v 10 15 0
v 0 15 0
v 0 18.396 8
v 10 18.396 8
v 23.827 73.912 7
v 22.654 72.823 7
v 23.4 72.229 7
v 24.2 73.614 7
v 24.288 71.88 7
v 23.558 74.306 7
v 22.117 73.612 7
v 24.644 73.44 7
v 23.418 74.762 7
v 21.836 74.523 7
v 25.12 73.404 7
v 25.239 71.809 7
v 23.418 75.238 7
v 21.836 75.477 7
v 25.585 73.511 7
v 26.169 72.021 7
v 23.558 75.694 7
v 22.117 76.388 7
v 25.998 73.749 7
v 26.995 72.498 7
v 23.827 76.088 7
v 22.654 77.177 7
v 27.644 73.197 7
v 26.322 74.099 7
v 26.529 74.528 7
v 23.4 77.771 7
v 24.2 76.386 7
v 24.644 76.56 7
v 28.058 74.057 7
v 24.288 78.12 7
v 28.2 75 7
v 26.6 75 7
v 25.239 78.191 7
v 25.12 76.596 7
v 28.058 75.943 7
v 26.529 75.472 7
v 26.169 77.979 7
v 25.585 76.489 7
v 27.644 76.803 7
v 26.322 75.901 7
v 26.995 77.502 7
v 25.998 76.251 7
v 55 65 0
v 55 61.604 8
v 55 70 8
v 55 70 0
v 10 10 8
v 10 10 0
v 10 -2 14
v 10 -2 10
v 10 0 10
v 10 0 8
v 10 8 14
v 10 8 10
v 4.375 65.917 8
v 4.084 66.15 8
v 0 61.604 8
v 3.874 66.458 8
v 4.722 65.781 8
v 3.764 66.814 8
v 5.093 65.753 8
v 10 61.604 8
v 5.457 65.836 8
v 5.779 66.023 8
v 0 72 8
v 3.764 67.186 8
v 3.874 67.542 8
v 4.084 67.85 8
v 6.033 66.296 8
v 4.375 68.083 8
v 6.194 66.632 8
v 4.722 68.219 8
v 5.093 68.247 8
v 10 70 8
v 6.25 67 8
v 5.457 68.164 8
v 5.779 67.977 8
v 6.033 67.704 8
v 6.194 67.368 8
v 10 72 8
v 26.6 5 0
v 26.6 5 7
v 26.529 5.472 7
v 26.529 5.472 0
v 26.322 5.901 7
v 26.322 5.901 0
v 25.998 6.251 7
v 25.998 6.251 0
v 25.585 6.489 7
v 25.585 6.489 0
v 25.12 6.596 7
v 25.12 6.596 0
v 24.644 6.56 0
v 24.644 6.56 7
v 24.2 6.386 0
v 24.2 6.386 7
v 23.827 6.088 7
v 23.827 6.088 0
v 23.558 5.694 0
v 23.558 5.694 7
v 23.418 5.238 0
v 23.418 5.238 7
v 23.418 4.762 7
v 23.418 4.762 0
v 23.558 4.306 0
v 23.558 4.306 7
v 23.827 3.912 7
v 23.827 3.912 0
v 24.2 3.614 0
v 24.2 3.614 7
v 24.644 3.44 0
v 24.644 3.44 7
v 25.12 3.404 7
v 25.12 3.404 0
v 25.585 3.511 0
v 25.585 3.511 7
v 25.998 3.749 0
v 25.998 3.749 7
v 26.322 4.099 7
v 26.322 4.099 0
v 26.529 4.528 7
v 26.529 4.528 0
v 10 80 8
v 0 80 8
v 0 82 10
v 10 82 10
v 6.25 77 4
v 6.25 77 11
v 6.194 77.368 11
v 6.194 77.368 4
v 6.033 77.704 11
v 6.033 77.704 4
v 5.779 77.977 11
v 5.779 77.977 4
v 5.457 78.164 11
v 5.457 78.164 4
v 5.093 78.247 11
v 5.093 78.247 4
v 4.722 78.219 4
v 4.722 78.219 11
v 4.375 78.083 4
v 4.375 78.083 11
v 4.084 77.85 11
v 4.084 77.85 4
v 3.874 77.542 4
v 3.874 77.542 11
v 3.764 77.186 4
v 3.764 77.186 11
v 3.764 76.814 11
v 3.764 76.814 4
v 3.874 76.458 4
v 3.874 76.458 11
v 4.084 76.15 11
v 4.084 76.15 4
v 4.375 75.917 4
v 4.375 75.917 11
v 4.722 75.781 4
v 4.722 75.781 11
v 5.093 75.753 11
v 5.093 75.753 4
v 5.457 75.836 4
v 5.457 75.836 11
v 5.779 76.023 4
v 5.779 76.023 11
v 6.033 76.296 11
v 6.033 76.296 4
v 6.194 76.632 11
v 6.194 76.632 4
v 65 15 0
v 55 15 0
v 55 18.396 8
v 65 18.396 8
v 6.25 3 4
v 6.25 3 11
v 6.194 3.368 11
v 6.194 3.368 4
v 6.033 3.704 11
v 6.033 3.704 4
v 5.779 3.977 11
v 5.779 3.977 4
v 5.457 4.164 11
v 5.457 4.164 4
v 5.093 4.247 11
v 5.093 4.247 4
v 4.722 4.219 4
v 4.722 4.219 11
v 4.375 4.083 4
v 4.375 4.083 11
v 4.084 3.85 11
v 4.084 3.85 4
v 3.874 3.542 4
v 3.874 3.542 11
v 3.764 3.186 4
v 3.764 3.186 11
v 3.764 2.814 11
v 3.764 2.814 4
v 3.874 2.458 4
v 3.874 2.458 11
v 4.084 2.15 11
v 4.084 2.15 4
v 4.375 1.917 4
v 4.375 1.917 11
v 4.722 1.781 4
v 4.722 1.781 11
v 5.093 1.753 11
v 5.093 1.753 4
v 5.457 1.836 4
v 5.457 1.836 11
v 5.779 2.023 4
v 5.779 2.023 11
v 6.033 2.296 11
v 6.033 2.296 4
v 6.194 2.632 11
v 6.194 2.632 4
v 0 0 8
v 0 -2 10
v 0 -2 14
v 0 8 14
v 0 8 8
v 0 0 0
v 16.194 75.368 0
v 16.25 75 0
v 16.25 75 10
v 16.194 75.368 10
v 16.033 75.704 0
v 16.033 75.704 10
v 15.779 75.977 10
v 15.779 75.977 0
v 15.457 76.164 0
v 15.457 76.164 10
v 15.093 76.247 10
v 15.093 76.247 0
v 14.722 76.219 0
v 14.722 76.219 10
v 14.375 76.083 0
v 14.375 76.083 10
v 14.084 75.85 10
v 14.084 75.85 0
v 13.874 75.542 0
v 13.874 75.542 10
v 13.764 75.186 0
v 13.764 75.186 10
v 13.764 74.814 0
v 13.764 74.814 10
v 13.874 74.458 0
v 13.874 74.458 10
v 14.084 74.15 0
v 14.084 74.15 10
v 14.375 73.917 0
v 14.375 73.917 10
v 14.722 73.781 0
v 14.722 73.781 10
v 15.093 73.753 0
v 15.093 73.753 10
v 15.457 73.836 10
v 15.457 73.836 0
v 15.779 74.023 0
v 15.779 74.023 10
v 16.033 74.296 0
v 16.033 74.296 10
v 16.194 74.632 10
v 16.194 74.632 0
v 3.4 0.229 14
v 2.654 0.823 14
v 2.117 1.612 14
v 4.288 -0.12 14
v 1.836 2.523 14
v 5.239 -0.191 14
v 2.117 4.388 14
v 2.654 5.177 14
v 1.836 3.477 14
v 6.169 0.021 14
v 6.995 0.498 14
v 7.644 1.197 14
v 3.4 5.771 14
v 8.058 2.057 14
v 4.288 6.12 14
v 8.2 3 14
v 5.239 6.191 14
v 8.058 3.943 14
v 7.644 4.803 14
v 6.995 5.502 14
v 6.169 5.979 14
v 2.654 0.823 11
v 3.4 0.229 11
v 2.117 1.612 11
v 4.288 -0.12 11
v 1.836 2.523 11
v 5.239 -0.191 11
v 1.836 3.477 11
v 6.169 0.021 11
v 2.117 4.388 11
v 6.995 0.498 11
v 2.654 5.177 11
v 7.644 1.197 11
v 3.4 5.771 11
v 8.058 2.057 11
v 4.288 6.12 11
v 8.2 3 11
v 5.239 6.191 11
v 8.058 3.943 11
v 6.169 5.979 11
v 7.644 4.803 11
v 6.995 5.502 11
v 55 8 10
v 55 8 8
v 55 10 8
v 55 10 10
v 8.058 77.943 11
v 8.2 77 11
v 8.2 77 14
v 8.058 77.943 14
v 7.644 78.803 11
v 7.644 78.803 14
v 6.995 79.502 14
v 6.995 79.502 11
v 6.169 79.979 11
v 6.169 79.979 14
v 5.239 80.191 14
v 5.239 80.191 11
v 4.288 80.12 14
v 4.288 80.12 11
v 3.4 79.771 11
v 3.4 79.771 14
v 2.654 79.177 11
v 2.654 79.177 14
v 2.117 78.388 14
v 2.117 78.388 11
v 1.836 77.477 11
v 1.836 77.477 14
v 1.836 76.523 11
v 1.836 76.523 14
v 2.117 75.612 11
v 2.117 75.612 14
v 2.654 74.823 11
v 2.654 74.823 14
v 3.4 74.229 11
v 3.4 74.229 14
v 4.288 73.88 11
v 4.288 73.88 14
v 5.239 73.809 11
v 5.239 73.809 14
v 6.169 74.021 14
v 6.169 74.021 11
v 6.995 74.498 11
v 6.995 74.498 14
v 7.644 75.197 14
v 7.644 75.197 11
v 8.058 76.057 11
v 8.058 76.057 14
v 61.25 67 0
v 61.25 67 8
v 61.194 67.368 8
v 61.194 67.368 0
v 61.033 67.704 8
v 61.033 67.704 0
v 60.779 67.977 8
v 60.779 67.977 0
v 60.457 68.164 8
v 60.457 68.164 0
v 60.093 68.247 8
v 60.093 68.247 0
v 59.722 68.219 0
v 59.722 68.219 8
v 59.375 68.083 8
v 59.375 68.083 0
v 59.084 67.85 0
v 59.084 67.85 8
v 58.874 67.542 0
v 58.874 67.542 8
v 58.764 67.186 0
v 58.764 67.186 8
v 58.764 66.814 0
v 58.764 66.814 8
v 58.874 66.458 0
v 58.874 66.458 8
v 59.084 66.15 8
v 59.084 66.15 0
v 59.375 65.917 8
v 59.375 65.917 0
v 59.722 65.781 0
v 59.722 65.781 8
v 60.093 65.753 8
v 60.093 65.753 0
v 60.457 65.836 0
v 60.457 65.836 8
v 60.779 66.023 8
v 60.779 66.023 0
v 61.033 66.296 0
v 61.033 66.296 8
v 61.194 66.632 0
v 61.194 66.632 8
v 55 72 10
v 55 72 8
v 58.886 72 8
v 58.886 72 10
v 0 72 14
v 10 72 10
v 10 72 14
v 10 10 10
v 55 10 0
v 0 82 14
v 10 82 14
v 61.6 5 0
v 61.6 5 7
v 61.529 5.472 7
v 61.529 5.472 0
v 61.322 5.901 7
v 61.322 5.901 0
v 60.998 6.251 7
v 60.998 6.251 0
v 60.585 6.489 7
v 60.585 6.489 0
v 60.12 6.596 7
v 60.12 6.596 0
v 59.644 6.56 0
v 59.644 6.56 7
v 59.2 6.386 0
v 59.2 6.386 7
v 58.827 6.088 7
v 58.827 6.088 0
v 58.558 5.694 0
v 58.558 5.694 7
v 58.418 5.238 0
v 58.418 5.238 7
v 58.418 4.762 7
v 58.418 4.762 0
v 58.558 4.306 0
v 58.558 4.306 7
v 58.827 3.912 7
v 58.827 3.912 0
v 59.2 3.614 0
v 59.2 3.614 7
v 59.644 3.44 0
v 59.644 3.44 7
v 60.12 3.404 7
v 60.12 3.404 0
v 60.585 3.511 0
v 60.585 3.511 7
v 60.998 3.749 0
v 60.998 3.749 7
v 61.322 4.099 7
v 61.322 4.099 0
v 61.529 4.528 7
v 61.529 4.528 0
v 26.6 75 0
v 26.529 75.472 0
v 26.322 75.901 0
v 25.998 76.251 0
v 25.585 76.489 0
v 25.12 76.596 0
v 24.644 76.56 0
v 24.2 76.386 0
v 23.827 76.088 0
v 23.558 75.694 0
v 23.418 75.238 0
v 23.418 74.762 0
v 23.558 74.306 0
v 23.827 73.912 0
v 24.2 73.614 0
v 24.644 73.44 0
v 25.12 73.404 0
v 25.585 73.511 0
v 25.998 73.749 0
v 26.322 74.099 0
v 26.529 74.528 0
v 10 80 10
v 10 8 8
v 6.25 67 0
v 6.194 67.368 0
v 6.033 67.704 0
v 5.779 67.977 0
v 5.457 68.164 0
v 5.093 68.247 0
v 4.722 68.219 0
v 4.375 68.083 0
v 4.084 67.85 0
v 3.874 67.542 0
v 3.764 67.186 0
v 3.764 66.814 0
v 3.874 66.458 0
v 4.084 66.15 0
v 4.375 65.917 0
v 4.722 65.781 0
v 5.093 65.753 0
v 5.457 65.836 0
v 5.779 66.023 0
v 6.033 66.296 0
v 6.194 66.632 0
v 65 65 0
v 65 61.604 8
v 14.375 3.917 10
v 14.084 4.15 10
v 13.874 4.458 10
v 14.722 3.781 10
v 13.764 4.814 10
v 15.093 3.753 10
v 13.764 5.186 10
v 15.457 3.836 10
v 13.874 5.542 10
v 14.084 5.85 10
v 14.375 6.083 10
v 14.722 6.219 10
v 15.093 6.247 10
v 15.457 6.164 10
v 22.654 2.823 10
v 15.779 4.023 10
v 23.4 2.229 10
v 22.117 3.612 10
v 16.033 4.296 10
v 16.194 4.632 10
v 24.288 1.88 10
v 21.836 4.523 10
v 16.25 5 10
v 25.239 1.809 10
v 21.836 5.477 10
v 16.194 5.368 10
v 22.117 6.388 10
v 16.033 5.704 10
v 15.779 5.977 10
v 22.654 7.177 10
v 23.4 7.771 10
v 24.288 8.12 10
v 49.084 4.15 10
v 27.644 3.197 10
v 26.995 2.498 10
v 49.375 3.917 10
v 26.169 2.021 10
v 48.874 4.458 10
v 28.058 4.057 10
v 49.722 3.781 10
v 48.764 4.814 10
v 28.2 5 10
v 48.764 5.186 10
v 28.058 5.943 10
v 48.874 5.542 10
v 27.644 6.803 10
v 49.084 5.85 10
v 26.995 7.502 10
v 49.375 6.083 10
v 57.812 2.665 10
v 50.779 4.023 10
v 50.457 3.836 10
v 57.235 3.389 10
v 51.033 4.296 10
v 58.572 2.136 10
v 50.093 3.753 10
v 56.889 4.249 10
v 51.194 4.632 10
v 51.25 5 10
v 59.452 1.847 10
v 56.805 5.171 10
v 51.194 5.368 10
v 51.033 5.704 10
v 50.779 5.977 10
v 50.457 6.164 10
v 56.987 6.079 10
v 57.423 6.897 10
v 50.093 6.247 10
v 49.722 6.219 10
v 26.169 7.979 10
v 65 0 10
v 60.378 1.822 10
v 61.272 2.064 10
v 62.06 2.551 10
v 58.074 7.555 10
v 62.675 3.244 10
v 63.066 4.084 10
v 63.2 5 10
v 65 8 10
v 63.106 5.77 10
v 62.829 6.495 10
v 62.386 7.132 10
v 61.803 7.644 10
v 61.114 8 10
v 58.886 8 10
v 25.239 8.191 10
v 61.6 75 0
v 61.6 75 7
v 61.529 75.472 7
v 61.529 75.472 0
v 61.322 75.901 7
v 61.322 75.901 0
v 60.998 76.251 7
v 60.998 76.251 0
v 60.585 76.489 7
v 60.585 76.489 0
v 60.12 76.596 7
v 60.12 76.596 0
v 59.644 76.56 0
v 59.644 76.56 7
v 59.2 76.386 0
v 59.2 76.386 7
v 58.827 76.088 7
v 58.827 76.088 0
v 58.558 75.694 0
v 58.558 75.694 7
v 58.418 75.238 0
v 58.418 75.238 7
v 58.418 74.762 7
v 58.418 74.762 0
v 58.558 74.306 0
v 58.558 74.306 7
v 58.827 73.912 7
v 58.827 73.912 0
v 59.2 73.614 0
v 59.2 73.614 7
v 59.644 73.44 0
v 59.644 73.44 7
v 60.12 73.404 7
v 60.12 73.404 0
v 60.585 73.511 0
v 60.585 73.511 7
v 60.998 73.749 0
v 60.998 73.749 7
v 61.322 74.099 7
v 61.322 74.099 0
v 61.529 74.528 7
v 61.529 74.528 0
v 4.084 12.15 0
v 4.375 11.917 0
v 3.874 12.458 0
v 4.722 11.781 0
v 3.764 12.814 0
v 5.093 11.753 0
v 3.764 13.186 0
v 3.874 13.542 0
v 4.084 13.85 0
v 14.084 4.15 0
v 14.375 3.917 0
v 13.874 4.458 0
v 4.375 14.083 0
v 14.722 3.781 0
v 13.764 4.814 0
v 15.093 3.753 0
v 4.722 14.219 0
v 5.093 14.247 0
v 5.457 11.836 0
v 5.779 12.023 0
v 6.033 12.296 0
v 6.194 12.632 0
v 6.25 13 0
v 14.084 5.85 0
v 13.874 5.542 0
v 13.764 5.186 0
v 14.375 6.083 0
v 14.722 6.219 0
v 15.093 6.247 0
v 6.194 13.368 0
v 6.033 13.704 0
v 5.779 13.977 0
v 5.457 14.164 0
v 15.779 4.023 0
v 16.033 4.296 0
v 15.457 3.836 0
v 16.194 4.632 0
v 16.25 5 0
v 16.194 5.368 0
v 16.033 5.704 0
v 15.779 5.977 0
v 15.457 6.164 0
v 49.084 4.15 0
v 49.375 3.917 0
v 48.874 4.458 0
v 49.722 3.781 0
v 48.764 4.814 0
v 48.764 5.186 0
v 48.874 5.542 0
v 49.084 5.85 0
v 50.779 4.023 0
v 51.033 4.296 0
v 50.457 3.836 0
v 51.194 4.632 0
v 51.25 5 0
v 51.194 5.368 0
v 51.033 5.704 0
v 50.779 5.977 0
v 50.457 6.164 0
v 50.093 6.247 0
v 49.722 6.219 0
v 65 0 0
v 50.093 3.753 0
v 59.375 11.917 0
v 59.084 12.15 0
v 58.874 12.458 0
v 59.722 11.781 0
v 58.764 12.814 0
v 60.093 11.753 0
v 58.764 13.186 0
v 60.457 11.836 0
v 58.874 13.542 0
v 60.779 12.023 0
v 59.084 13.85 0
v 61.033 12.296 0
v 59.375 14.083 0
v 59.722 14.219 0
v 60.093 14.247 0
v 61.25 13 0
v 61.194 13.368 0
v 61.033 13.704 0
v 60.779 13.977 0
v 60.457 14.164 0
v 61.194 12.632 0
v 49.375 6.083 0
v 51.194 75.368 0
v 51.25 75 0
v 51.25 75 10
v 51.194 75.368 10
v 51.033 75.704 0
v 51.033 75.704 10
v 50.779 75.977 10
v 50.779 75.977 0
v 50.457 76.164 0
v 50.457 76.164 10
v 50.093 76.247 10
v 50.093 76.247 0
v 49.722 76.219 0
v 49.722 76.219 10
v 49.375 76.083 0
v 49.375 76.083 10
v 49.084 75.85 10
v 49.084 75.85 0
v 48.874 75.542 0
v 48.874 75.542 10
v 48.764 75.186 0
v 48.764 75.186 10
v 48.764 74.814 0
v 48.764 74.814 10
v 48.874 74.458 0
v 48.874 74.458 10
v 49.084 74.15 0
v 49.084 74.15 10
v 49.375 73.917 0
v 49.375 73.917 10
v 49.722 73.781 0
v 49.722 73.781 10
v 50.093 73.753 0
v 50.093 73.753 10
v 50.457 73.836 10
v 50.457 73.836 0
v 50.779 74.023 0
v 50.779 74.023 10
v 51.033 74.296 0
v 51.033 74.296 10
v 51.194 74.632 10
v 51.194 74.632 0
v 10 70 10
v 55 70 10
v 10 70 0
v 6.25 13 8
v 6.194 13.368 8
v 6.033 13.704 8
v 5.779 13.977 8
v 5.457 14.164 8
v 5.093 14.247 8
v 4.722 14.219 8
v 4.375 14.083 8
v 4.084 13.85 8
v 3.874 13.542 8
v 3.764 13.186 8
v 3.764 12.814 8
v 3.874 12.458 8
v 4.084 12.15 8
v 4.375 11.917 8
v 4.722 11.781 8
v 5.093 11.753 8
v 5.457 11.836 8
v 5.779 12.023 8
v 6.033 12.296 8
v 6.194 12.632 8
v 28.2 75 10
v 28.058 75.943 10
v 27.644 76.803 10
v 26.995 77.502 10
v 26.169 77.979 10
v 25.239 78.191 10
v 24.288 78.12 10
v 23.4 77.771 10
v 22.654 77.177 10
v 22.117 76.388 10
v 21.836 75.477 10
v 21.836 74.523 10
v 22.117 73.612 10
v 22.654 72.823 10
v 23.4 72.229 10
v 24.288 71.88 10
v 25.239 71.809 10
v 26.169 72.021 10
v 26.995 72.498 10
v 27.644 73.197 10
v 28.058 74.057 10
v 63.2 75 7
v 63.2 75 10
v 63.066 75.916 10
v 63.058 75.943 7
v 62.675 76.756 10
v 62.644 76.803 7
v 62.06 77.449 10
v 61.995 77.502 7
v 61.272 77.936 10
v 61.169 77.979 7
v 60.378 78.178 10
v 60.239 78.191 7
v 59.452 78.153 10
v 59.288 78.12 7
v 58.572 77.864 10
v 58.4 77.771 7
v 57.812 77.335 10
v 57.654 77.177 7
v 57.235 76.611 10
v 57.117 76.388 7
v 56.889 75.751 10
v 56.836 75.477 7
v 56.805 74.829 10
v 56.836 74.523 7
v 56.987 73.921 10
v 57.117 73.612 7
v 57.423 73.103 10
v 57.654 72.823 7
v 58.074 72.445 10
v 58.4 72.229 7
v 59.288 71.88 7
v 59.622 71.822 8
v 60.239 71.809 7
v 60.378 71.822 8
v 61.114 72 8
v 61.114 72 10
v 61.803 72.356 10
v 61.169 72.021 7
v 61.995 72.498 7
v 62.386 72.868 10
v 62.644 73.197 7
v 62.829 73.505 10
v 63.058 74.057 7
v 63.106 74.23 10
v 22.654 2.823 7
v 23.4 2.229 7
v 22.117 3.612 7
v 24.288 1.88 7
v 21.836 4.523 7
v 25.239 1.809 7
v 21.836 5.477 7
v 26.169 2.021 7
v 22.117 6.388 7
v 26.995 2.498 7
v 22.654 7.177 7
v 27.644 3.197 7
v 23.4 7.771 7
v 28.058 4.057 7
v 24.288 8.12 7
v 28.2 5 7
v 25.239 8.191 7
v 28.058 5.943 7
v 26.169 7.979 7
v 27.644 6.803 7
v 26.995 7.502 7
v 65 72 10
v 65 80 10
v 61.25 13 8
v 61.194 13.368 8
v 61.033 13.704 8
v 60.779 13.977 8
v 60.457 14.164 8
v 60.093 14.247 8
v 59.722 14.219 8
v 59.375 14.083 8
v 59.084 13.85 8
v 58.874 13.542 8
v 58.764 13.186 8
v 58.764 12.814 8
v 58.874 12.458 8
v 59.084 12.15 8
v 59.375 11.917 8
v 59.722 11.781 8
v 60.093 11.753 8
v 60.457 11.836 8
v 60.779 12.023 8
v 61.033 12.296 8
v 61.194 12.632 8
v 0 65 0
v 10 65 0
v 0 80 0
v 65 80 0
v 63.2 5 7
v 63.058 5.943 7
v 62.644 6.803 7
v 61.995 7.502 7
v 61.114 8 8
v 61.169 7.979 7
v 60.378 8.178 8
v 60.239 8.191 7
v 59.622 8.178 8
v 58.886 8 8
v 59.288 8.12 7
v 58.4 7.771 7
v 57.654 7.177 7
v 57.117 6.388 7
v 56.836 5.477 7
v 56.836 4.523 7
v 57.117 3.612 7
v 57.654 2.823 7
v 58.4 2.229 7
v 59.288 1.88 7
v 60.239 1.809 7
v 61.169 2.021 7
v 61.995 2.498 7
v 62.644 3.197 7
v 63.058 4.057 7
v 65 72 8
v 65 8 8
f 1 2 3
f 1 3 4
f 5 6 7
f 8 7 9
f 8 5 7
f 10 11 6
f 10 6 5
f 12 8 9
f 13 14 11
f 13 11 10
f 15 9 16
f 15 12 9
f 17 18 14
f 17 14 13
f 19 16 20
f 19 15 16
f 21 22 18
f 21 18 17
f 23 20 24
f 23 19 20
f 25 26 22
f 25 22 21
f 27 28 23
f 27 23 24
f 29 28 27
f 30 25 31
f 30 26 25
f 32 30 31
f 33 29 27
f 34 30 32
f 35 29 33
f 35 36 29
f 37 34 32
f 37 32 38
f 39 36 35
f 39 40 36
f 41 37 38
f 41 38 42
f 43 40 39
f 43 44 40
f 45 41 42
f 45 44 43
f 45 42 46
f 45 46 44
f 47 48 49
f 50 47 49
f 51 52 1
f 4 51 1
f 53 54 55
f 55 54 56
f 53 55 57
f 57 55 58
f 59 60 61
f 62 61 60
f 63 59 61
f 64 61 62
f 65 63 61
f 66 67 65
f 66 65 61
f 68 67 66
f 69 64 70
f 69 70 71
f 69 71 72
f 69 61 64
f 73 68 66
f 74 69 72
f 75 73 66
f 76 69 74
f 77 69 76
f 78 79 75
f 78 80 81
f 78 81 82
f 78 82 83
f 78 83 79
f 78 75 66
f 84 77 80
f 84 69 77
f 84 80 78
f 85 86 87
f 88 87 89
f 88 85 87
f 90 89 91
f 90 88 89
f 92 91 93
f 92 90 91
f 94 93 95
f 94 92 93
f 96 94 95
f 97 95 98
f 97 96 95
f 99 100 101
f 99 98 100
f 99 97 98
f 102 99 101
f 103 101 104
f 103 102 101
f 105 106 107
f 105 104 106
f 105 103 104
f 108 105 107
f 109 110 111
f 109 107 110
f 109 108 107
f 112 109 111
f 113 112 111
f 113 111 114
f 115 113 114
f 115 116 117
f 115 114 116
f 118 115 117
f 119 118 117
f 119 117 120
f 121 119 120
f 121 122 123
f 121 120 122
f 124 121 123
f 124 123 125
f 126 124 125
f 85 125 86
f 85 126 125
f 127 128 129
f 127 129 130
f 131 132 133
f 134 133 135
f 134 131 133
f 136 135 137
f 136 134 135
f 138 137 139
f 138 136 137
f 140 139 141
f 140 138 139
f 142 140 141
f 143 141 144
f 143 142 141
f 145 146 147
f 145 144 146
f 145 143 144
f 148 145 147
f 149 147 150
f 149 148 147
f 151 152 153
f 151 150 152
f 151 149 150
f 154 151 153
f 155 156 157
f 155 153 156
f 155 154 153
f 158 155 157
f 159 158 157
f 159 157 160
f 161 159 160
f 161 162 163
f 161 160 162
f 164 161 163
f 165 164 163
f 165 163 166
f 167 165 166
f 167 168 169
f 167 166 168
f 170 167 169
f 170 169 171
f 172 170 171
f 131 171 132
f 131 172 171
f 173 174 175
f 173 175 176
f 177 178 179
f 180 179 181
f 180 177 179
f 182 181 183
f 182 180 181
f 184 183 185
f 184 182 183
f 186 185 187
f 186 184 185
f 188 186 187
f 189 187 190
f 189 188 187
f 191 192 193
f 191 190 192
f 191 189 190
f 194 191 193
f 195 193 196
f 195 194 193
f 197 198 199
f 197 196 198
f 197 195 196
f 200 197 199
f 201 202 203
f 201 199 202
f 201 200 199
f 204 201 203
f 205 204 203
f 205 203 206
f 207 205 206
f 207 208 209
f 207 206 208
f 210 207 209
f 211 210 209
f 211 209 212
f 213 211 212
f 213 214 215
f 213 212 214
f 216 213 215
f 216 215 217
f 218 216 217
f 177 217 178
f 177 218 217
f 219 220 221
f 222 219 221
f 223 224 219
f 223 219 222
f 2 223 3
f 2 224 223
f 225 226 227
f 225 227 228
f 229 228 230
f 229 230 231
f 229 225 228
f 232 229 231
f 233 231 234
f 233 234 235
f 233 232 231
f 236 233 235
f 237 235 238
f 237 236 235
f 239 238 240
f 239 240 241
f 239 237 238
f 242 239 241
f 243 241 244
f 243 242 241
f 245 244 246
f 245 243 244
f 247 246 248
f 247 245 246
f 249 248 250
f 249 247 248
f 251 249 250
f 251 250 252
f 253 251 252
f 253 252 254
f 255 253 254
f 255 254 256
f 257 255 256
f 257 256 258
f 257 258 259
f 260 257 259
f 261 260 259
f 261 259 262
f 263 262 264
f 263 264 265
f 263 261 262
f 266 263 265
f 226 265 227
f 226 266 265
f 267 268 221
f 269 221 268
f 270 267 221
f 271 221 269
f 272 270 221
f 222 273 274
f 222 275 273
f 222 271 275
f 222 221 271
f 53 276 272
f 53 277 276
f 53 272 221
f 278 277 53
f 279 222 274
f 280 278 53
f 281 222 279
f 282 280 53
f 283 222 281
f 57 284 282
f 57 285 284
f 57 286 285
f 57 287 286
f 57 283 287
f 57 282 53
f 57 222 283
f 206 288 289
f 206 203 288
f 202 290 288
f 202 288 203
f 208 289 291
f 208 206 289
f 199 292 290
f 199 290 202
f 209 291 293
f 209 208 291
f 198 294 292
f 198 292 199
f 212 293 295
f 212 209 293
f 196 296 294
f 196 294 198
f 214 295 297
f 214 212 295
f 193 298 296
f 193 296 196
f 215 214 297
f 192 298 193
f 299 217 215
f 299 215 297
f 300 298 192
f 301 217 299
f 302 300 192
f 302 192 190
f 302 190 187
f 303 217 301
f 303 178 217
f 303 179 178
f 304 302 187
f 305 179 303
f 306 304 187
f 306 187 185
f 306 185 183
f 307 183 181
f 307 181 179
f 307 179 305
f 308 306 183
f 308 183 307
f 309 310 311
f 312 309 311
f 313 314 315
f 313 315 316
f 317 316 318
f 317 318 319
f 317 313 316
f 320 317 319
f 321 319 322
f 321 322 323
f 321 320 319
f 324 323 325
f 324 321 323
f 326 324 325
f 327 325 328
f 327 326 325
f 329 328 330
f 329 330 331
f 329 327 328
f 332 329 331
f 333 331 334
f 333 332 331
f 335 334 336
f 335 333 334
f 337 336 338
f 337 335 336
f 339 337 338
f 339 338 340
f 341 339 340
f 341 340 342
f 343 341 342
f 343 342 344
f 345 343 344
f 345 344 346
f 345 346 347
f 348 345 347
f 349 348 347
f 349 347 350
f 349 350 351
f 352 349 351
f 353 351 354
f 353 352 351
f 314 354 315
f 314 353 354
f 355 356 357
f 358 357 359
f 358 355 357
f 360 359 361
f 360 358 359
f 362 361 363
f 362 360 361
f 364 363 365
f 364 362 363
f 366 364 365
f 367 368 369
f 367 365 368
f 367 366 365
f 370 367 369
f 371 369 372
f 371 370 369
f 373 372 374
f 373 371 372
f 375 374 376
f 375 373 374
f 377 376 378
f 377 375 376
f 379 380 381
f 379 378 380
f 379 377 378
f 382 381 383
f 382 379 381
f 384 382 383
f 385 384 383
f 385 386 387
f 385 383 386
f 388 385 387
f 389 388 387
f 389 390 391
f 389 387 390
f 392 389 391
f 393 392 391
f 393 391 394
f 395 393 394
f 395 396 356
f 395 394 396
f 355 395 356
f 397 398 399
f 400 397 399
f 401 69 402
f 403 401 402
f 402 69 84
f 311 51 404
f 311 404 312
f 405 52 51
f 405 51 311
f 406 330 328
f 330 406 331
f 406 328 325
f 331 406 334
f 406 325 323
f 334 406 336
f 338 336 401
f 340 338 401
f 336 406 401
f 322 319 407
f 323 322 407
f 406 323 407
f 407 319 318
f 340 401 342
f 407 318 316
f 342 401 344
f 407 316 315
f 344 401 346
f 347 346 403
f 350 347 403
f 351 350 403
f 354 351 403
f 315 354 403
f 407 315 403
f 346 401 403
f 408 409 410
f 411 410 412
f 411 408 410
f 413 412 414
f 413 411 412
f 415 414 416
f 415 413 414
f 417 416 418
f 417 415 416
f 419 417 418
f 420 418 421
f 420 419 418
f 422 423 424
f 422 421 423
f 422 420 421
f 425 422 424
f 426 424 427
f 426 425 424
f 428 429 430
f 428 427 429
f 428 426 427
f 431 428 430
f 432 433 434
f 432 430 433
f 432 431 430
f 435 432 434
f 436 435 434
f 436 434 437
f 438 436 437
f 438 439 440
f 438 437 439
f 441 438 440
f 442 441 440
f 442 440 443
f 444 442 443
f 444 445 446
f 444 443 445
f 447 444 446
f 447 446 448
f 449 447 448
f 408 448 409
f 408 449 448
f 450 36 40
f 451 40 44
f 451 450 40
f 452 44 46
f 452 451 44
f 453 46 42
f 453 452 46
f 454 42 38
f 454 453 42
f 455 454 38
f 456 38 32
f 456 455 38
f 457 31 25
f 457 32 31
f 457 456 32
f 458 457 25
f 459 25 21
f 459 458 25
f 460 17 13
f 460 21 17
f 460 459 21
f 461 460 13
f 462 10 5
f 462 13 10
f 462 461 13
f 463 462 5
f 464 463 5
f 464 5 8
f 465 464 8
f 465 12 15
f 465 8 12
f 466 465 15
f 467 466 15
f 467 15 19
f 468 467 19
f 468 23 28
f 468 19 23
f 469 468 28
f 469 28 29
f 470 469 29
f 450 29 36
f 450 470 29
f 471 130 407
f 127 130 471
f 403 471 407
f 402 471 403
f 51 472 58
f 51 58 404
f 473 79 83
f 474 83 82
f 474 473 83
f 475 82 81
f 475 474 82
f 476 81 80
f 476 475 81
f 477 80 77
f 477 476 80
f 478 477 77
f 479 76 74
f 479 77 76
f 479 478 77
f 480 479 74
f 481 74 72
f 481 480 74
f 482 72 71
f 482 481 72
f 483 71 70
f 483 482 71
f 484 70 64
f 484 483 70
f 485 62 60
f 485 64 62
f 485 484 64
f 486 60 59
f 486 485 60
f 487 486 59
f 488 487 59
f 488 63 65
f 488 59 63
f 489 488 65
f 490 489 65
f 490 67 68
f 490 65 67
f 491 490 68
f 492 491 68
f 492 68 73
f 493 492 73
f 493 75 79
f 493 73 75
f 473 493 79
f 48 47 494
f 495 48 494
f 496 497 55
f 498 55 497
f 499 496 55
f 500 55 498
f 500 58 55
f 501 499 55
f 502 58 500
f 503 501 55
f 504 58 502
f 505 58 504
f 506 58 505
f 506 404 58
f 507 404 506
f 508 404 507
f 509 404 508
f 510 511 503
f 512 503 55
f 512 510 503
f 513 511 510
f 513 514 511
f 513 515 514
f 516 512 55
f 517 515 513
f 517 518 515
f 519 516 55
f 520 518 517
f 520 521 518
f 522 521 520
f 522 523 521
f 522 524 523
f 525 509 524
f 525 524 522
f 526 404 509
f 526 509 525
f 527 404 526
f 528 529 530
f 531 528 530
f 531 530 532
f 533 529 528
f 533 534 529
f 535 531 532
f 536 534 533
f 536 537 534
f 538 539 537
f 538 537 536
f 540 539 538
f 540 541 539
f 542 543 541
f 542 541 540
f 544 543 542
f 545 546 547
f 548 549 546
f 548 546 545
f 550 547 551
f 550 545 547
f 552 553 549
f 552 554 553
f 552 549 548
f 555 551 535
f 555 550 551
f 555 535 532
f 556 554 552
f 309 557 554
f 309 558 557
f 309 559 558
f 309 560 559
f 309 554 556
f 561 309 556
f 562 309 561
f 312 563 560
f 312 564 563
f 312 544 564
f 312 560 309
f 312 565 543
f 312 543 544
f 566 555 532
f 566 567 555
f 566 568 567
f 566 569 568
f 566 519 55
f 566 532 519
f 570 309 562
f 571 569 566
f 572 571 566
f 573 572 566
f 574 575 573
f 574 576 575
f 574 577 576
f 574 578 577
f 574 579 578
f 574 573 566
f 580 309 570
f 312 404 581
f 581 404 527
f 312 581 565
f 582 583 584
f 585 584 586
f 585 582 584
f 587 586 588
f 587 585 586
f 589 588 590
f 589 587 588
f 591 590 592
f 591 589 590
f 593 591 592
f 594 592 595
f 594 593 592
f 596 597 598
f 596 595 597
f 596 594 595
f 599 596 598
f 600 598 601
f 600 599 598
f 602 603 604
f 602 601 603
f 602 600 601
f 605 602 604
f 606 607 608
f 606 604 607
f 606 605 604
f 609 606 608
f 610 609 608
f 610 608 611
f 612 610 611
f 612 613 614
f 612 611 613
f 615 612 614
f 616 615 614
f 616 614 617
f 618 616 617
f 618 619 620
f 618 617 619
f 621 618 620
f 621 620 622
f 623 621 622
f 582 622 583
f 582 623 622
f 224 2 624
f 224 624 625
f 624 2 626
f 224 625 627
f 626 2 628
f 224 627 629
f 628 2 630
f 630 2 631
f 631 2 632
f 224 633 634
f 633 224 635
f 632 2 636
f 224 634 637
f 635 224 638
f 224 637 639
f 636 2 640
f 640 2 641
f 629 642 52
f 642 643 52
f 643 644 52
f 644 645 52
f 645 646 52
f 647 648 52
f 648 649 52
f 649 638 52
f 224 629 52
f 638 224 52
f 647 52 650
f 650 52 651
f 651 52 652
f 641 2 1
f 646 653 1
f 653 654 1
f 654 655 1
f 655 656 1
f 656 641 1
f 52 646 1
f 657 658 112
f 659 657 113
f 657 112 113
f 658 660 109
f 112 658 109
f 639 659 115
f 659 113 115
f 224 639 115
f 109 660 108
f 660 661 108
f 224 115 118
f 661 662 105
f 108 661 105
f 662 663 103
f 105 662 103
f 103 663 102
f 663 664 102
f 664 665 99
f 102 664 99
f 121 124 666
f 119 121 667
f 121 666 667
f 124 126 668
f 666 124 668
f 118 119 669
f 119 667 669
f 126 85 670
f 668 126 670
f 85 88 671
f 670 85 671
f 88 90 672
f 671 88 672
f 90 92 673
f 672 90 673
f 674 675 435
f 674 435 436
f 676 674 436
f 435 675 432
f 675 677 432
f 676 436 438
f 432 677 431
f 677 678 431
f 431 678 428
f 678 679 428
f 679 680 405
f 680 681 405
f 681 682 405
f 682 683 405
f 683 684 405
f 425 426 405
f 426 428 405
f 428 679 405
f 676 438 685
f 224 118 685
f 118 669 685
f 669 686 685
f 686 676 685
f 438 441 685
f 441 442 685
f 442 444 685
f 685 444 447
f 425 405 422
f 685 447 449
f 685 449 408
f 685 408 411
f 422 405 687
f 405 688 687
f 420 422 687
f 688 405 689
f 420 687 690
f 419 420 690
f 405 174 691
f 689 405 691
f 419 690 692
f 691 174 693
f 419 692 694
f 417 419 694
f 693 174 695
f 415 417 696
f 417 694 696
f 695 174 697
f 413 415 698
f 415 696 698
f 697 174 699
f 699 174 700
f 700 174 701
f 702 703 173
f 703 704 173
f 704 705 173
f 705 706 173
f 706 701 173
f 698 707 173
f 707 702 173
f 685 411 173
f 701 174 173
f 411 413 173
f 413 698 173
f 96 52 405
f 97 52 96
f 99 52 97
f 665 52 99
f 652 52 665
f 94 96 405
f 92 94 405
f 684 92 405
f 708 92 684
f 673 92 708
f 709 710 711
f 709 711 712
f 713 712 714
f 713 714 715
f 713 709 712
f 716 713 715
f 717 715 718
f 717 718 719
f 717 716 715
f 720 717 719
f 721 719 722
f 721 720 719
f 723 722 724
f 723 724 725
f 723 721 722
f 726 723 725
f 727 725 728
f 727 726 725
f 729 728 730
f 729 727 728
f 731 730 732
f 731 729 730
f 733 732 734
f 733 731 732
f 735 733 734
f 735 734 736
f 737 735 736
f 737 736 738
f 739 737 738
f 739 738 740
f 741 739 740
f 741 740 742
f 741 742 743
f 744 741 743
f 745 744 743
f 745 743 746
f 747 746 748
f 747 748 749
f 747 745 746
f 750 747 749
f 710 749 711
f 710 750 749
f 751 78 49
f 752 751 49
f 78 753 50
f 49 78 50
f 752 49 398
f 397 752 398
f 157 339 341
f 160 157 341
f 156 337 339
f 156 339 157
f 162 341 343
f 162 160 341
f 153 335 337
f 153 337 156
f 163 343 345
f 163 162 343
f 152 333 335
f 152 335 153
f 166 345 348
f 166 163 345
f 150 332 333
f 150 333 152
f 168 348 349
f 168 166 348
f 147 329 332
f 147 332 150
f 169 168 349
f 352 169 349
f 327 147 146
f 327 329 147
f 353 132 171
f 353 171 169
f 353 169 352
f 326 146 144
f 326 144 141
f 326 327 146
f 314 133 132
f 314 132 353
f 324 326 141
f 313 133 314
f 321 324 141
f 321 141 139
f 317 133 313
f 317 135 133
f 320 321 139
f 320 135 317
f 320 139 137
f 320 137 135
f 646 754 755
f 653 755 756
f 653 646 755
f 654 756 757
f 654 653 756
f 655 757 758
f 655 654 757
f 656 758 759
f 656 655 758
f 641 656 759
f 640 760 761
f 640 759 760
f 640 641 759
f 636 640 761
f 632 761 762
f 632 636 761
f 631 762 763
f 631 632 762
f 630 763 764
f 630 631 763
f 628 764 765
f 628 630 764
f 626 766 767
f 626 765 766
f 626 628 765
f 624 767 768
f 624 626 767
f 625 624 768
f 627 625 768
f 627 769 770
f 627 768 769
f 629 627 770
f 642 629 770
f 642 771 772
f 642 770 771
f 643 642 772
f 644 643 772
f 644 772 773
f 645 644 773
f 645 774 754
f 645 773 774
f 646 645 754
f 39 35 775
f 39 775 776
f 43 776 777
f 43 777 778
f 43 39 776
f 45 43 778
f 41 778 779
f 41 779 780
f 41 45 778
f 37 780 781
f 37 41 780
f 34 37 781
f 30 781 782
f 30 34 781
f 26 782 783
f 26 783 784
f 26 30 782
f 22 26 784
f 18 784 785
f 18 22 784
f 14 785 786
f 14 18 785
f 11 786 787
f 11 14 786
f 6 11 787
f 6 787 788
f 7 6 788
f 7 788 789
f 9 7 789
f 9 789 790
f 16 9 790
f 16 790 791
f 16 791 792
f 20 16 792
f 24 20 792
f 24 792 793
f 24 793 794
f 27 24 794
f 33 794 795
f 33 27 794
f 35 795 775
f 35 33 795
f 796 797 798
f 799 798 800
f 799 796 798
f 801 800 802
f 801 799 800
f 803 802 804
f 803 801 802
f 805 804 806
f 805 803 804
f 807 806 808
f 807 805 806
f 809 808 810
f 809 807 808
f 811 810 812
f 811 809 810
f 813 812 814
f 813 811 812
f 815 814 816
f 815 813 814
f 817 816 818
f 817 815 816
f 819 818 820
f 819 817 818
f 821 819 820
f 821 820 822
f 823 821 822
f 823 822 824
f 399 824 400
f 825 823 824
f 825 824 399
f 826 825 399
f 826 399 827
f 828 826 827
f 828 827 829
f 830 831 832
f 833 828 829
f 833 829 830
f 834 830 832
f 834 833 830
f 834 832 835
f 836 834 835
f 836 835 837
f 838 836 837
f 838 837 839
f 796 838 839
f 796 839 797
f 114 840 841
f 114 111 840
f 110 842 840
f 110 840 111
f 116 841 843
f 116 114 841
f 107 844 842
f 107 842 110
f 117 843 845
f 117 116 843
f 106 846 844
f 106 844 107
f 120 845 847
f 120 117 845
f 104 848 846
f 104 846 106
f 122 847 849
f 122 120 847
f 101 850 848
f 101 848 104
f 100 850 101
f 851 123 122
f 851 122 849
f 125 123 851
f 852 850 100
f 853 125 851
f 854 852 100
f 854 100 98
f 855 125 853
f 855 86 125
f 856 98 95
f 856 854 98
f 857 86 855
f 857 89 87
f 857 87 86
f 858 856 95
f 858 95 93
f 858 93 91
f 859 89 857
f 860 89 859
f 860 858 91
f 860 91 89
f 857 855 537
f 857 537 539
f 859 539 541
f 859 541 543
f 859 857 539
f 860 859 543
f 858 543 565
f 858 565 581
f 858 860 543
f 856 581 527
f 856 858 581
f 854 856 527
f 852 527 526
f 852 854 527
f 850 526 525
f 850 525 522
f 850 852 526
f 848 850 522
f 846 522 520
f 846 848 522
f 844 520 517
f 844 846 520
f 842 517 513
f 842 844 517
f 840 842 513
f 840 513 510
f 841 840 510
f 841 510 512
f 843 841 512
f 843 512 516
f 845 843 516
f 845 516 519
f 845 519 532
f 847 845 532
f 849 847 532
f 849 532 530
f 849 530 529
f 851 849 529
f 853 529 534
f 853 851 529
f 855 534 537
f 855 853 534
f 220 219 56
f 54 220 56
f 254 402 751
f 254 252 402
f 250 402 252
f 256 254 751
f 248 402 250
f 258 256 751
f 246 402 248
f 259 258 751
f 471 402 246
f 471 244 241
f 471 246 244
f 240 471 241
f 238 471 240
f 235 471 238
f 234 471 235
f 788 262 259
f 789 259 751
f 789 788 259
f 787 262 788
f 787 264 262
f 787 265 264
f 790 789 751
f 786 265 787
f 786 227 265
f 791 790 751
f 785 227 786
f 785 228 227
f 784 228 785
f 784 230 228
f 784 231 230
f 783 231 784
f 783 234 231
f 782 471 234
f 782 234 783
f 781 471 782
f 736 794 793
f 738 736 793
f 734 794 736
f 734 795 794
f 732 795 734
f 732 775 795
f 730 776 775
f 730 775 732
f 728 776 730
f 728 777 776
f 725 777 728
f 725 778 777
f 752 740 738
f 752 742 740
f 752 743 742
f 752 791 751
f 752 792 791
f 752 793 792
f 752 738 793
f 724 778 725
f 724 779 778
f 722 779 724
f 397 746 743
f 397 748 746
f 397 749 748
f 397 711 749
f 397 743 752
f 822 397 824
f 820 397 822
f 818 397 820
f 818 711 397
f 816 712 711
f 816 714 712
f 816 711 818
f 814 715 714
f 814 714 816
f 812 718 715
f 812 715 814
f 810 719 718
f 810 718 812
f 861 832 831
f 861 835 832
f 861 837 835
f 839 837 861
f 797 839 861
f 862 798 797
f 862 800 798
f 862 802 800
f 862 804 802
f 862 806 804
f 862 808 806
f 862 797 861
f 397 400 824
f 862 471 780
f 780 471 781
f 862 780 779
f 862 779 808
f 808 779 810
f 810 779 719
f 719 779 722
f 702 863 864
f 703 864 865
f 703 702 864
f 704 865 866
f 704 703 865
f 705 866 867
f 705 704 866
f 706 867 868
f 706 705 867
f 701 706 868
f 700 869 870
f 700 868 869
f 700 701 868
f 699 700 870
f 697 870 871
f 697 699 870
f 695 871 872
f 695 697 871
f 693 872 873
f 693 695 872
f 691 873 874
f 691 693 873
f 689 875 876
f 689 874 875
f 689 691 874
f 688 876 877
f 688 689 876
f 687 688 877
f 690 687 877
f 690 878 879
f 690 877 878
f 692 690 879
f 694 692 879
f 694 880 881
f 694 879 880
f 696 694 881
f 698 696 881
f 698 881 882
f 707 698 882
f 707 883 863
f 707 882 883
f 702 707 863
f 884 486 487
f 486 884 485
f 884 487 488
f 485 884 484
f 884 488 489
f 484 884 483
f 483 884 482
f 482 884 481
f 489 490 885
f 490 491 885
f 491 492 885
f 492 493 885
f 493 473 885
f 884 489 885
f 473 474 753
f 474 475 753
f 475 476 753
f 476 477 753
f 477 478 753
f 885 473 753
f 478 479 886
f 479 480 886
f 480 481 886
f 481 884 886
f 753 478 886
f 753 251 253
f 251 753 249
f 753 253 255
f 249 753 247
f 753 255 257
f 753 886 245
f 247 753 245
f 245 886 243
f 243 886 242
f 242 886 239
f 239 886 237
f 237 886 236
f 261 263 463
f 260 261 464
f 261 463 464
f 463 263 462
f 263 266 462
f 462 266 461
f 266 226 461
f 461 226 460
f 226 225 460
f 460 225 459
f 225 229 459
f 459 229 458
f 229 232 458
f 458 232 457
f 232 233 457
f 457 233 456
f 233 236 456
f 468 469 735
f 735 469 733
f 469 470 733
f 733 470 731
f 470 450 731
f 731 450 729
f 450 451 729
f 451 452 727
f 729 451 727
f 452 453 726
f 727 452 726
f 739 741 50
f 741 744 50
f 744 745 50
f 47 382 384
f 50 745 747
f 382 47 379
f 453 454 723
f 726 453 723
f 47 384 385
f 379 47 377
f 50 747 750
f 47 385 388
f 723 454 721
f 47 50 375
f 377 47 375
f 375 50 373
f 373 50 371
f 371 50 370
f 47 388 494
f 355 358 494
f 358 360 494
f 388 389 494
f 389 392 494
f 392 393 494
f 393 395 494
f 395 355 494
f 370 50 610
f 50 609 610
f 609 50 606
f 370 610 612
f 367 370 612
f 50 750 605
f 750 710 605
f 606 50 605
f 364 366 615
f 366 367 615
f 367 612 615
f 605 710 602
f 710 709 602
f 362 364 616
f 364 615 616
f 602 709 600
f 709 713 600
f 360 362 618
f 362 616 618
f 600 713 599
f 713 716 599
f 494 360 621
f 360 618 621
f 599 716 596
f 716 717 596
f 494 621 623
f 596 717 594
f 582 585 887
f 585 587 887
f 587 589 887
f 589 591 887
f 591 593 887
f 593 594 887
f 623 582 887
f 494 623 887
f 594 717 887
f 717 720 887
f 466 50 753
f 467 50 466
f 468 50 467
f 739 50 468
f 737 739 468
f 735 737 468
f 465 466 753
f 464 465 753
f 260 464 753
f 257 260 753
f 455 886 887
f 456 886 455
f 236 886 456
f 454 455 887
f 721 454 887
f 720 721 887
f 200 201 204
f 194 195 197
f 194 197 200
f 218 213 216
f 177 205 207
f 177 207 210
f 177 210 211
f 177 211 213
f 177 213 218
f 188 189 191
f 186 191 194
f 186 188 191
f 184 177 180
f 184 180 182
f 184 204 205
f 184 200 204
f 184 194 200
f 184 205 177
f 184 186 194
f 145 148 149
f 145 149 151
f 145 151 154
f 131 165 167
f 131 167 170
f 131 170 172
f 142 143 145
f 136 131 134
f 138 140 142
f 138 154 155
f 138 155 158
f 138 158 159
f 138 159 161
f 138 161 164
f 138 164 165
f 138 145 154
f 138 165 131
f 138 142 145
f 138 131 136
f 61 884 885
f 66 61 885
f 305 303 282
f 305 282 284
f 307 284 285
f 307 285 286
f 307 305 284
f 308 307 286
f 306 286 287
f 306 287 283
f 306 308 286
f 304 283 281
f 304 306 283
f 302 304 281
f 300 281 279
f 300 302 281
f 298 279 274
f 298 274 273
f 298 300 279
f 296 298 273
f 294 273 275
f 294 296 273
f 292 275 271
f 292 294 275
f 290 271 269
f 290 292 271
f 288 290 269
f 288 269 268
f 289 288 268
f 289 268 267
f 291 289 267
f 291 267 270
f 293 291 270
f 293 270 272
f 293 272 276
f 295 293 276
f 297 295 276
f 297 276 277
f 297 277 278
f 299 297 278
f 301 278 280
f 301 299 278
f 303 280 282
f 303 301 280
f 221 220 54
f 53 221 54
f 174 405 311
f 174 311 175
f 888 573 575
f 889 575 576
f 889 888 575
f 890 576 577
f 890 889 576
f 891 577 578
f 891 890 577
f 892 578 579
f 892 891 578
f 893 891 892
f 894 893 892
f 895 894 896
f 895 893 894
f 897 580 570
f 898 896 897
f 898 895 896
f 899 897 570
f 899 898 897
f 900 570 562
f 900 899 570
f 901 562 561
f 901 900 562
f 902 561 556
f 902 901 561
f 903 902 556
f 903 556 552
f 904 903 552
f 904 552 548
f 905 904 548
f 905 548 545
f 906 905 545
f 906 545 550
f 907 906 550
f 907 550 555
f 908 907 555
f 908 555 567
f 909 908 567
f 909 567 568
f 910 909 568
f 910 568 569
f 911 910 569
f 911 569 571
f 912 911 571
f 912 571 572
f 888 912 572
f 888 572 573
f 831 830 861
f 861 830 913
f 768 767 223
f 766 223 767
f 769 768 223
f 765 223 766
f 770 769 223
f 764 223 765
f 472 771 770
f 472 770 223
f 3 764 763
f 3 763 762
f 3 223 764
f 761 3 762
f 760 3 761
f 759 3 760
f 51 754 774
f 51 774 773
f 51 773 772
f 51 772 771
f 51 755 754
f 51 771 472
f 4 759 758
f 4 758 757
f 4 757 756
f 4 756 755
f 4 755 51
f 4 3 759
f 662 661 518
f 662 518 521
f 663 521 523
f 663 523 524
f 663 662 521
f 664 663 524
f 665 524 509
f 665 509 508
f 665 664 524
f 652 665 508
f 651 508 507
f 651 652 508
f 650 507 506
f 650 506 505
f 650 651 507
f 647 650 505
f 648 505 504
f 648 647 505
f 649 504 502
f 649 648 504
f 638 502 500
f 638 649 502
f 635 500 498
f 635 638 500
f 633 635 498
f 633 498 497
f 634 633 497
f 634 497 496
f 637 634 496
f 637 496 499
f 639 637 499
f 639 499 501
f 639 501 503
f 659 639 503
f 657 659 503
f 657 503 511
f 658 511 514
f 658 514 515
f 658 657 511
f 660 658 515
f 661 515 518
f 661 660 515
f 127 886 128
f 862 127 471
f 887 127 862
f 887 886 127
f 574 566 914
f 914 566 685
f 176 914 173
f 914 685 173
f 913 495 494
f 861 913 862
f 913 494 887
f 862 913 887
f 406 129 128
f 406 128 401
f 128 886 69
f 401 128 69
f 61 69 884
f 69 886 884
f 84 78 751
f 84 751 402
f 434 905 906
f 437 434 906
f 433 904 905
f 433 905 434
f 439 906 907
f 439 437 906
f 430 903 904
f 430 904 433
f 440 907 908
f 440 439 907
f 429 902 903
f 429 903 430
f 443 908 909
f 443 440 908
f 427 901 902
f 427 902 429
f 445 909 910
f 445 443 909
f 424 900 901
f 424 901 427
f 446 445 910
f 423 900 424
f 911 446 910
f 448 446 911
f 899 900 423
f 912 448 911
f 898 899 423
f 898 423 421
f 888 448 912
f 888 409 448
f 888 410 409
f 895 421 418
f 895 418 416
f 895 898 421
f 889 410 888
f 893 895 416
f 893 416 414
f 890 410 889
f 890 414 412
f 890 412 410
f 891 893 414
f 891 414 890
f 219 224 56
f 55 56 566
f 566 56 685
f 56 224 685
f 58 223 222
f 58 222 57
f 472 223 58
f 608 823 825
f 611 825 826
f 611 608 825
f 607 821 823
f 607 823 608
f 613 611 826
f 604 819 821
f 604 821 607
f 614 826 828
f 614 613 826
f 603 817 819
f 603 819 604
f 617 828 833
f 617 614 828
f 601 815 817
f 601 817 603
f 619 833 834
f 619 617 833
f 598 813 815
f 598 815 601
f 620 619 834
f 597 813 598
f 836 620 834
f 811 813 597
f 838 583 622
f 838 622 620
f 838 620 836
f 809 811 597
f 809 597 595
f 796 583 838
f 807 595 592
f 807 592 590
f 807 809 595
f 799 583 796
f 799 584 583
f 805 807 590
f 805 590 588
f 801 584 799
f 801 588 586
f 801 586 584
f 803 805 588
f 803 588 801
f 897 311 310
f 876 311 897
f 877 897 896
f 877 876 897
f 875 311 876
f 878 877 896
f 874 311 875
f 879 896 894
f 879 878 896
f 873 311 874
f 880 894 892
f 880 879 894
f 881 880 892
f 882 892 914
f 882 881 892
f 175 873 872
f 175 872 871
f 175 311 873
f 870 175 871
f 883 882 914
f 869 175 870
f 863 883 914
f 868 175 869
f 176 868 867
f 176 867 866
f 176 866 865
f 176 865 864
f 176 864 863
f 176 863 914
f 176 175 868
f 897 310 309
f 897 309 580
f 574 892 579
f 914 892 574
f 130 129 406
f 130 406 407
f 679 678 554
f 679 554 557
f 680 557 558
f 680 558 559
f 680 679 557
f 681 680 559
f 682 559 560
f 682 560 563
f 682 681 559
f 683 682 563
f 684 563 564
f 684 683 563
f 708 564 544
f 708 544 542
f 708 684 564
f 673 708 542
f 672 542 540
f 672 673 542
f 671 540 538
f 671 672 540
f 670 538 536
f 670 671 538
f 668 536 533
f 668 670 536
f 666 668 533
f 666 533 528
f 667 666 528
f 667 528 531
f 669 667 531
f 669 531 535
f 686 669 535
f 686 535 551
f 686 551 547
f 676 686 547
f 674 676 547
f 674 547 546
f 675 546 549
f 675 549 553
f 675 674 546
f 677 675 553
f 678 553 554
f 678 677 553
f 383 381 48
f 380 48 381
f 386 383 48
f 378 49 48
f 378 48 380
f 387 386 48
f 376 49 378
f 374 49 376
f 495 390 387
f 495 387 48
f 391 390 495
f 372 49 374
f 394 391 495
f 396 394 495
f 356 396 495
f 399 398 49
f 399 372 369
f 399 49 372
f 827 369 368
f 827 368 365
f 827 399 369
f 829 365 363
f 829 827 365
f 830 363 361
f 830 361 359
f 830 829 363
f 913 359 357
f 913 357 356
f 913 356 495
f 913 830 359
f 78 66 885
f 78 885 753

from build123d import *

# Parameters (mm, degrees)
BOX010_W          = 10
BOX010_H          = 11
BOX010_DEPTH      = 2
BOX011_W          = 10
BOX011_H          = 11
BOX011_DEPTH      = 2
BOX009_W          = 10
BOX009_H          = 11
BOX009_DEPTH      = 2
BOX008_W          = 10
BOX008_H          = 11
BOX008_DEPTH      = 2
CYLINDER018_R     = 3.2
CYLINDER018_DEPTH = 3
CYLINDER019_R     = 1.25
CYLINDER019_DEPTH = 10
CYLINDER017_R     = 3.2
CYLINDER017_DEPTH = 3
CYLINDER016_R     = 1.25
CYLINDER016_DEPTH = 10
CYLINDER011_R     = 1.25
CYLINDER011_DEPTH = 10
CYLINDER010_R     = 1.25
CYLINDER010_DEPTH = 10
CYLINDER014_R     = 1.25
CYLINDER014_DEPTH = 10
CYLINDER015_R     = 1.25
CYLINDER015_DEPTH = 10
CYLINDER007_R     = 3.2
CYLINDER007_DEPTH = 3
CYLINDER006_R     = 3.2
CYLINDER006_DEPTH = 3
CYLINDER004_R     = 1.6
CYLINDER004_DEPTH = 10
CYLINDER005_R     = 1.6
CYLINDER005_DEPTH = 10
BOX006_W          = 65
BOX006_H          = 10
BOX006_DEPTH      = 12
BOX006_ROLL_ANGLE = -23
BOX005_W          = 65
BOX005_H          = 10
BOX005_DEPTH      = 12
BOX005_ROLL_ANGLE = -23
CYLINDER002_R     = 1.25
CYLINDER002_DEPTH = 10
CYLINDER003_R     = 1.25
CYLINDER003_DEPTH = 10
CYLINDER001_R     = 1.25
CYLINDER001_DEPTH = 10
CYLINDER_R        = 1.25
CYLINDER_DEPTH    = 10
BOX004_W          = 45
BOX004_H          = 9
BOX004_DEPTH      = 10
BOX003_W          = 45
BOX003_H          = 9
BOX003_DEPTH      = 10
BOX001_W          = 65
BOX001_H          = 42
BOX001_DEPTH      = 10
BOX_W             = 65
BOX_H             = 80
BOX_DEPTH         = 10
BOX007_W          = 10
BOX007_H          = 10
BOX007_DEPTH      = 10
CHAMFER_SIZE      = 6
BOX002_W          = 10
BOX002_H          = 10
BOX002_DEPTH      = 10
CHAMFER002_SIZE   = 6


with BuildPart() as box010:
    # Box010 → Box010 (new body)
    with BuildSketch(Plane(origin=(55, 8, 8), x_dir=(1, 0, 0), z_dir=(0, 0, 1))):
        with Locations((5, 5.5)):
            Rectangle(BOX010_W, BOX010_H)
    extrude(amount=BOX010_DEPTH)


with BuildPart() as box011:
    # Box011 → Box011 (new body)
    with BuildSketch(Plane(origin=(55, 61, 8), x_dir=(1, 0, 0), z_dir=(0, 0, 1))):
        with Locations((5, 5.5)):
            Rectangle(BOX011_W, BOX011_H)
    extrude(amount=BOX011_DEPTH)


with BuildPart() as box009:
    # Box009 → Box009 (new body)
    with BuildSketch(Plane(origin=(0, 61, 8), x_dir=(1, 0, 0), z_dir=(0, 0, 1))):
        with Locations((5, 5.5)):
            Rectangle(BOX009_W, BOX009_H)
    extrude(amount=BOX009_DEPTH)


with BuildPart() as fusion019:
    # Box008 → Box008 (new body)
    with BuildSketch(Plane(origin=(0, 8, 8), x_dir=(1, 0, 0), z_dir=(0, 0, 1))):
        with Locations((5, 5.5)):
            Rectangle(BOX008_W, BOX008_H)
    extrude(amount=BOX008_DEPTH)

    # Fusion019: union Box010, Box011, Box009
    add(box010.part)
    add(box011.part)
    add(box009.part)


with BuildPart() as cylinder018:
    # Cylinder018 → Cylinder018 (new body)
    with BuildSketch(Plane(origin=(5, 3, 11), x_dir=(1, 0, 0), z_dir=(0, 0, 1))):
        Circle(CYLINDER018_R)
    extrude(amount=CYLINDER018_DEPTH)


with BuildPart() as fusion017:
    # Cylinder019 → Cylinder019 (new body)
    with BuildSketch(Plane(origin=(5, 3, 4), x_dir=(1, 0, 0), z_dir=(0, 0, 1))):
        Circle(CYLINDER019_R)
    extrude(amount=CYLINDER019_DEPTH)

    # Fusion017: union Cylinder018
    add(cylinder018.part)


with BuildPart() as fusion017_1:
    # Fusion017 placement: moved
    add(fusion017.part.moved(Location((0, 74, 0))))


with BuildPart() as cylinder017:
    # Cylinder017 → Cylinder017 (new body)
    with BuildSketch(Plane(origin=(5, 3, 11), x_dir=(1, 0, 0), z_dir=(0, 0, 1))):
        Circle(CYLINDER017_R)
    extrude(amount=CYLINDER017_DEPTH)


with BuildPart() as fusion018:
    # Cylinder016 → Cylinder016 (new body)
    with BuildSketch(Plane(origin=(5, 3, 4), x_dir=(1, 0, 0), z_dir=(0, 0, 1))):
        Circle(CYLINDER016_R)
    extrude(amount=CYLINDER016_DEPTH)

    # Fusion016: union Cylinder017
    add(cylinder017.part)

    # Fusion018: union Fusion017
    add(fusion017_1.part)


with BuildPart() as cylinder011:
    # Cylinder011 → Cylinder011 (new body)
    with BuildSketch(Plane.XY):
        Circle(CYLINDER011_R)
    extrude(amount=CYLINDER011_DEPTH)


with BuildPart() as fusion011:
    # Cylinder010 → Cylinder010 (new body)
    with BuildSketch(Plane(origin=(0, 70, 0), x_dir=(1, 0, 0), z_dir=(0, 0, 1))):
        Circle(CYLINDER010_R)
    extrude(amount=CYLINDER010_DEPTH)

    # Fusion011: union Cylinder011
    add(cylinder011.part)


with BuildPart() as fusion011_1:
    # Fusion011 placement: moved
    add(fusion011.part.moved(Location((50, 5, 0))))


with BuildPart() as cylinder014:
    # Cylinder014 → Cylinder014 (new body)
    with BuildSketch(Plane.XY):
        Circle(CYLINDER014_R)
    extrude(amount=CYLINDER014_DEPTH)


with BuildPart() as fusion012:
    # Cylinder015 → Cylinder015 (new body)
    with BuildSketch(Plane(origin=(0, 70, 0), x_dir=(1, 0, 0), z_dir=(0, 0, 1))):
        Circle(CYLINDER015_R)
    extrude(amount=CYLINDER015_DEPTH)

    # Fusion012: union Cylinder014
    add(cylinder014.part)


with BuildPart() as fusion012_1:
    # Fusion012 placement: moved
    add(fusion012.part.moved(Location((15, 5, 0))))


with BuildPart() as cylinder007:
    # Cylinder007 → Cylinder007 (new body)
    with BuildSketch(Plane(origin=(5, 0, 0), x_dir=(1, 0, 0), z_dir=(0, 0, 1))):
        Circle(CYLINDER007_R)
    extrude(amount=CYLINDER007_DEPTH)


with BuildPart() as cylinder006:
    # Cylinder006 → Cylinder006 (new body)
    with BuildSketch(Plane(origin=(5, 70, 0), x_dir=(1, 0, 0), z_dir=(0, 0, 1))):
        Circle(CYLINDER006_R)
    extrude(amount=CYLINDER006_DEPTH)


with BuildPart() as fusion006:
    # Fusion006 base: copy of Cylinder006
    add(cylinder006.part)

    # Fusion006: union Cylinder007
    add(cylinder007.part)


with BuildPart() as fusion006_1:
    # Fusion006 placement: moved
    add(fusion006.part.moved(Location((0, 5, 7))))


with BuildPart() as cylinder004:
    # Cylinder004 → Cylinder004 (new body)
    with BuildSketch(Plane(origin=(5, 0, 0), x_dir=(1, 0, 0), z_dir=(0, 0, 1))):
        Circle(CYLINDER004_R)
    extrude(amount=CYLINDER004_DEPTH)


with BuildPart() as cylinder005:
    # Cylinder005 → Cylinder005 (new body)
    with BuildSketch(Plane(origin=(5, 70, 0), x_dir=(1, 0, 0), z_dir=(0, 0, 1))):
        Circle(CYLINDER005_R)
    extrude(amount=CYLINDER005_DEPTH)


with BuildPart() as fusion007:
    # Fusion008 base: copy of Cylinder005
    add(cylinder005.part)

    # Fusion008: union Cylinder004
    add(cylinder004.part)


with BuildPart() as fusion007_1:
    # Fusion008 placement: moved
    add(fusion007.part.moved(Location((0, 5, 0))))

    # Fusion007: union Fusion006
    add(fusion006_1.part)


with BuildPart() as fusion007_2:
    # Fusion007 placement: moved
    add(fusion007_1.part.moved(Location((20, 0, 0))))


with BuildPart() as fusion004:
    # Fusion004 base: copy of Cylinder006
    add(cylinder006.part)

    # Fusion004: union Cylinder007
    add(cylinder007.part)


with BuildPart() as fusion004_1:
    # Fusion004 placement: moved
    add(fusion004.part.moved(Location((0, 5, 7))))


with BuildPart() as fusion014:
    # Fusion003 base: copy of Cylinder005
    add(cylinder005.part)

    # Fusion003: union Cylinder004
    add(cylinder004.part)


with BuildPart() as fusion014_1:
    # Fusion003 placement: moved
    add(fusion014.part.moved(Location((0, 5, 0))))

    # Fusion005: union Fusion004
    add(fusion004_1.part)


with BuildPart() as fusion014_2:
    # Fusion005 placement: moved
    add(fusion014_1.part.moved(Location((55, 0, 0))))

    # Fusion009: union Fusion007
    add(fusion007_2.part)

    # Fusion014: union Fusion011, Fusion012
    add(fusion011_1.part)
    add(fusion012_1.part)


with BuildPart() as box006:
    # Box006 → Box006 (new body)
    with BuildSketch(Plane.XY):
        with Locations((32.5, 5)):
            Rectangle(BOX006_W, BOX006_H)
    extrude(amount=BOX006_DEPTH)


with BuildPart() as box006_1:
    # Box006 roll: moved
    add(box006.part.rotate(Axis((0, 0, 0), (1, 0, 0)), BOX006_ROLL_ANGLE))


with BuildPart() as box006_2:
    # Box006 placement: moved
    add(box006_1.part.moved(Location((0, 15, 0))))


with BuildPart() as box005:
    # Box005 → Box005 (new body)
    with BuildSketch(Plane.XY):
        with Locations((32.5, 5)):
            Rectangle(BOX005_W, BOX005_H)
    extrude(amount=BOX005_DEPTH)


with BuildPart() as box005_1:
    # Box005 roll: moved
    add(box005.part.rotate(Axis((0, 0, 0), (1, 0, 0)), BOX005_ROLL_ANGLE))


with BuildPart() as box005_2:
    # Box005 placement: moved
    add(box005_1.part.moved(Location((0, 15, 0))))


with BuildPart() as fusion013:
    # Part__Mirroring: instance of Box005
    add(box005_2.part.mirror(Plane(origin=(0, 0, 0), x_dir=(1, 0, 0), z_dir=(0, 1, 0))))


with BuildPart() as fusion013_1:
    # Part__Mirroring placement: moved
    add(fusion013.part.moved(Location((0, 80, 0))))

    # Fusion013: union Box006
    add(box006_2.part)


with BuildPart() as cylinder002:
    # Cylinder002 → Cylinder002 (new body)
    with BuildSketch(Plane(origin=(0, 54, 0), x_dir=(1, 0, 0), z_dir=(0, 0, 1))):
        Circle(CYLINDER002_R)
    extrude(amount=CYLINDER002_DEPTH)


with BuildPart() as fusion001:
    # Cylinder003 → Cylinder003 (new body)
    with BuildSketch(Plane.XY):
        Circle(CYLINDER003_R)
    extrude(amount=CYLINDER003_DEPTH)

    # Fusion001: union Cylinder002
    add(cylinder002.part)


with BuildPart() as fusion001_1:
    # Fusion001 placement: moved
    add(fusion001.part.moved(Location((60, 13, 0))))


with BuildPart() as cylinder001:
    # Cylinder001 → Cylinder001 (new body)
    with BuildSketch(Plane(origin=(0, 54, 0), x_dir=(1, 0, 0), z_dir=(0, 0, 1))):
        Circle(CYLINDER001_R)
    extrude(amount=CYLINDER001_DEPTH)


with BuildPart() as fusion002:
    # Cylinder → Cylinder (new body)
    with BuildSketch(Plane.XY):
        Circle(CYLINDER_R)
    extrude(amount=CYLINDER_DEPTH)

    # Fusion: union Cylinder001
    add(cylinder001.part)


with BuildPart() as fusion002_1:
    # Fusion placement: moved
    add(fusion002.part.moved(Location((5, 13, 0))))

    # Fusion002: union Fusion001
    add(fusion001_1.part)


with BuildPart() as box004:
    # Box004 → Box004 (new body)
    with BuildSketch(Plane(origin=(10, 61, 0), x_dir=(1, 0, 0), z_dir=(0, 0, 1))):
        with Locations((22.5, 4.5)):
            Rectangle(BOX004_W, BOX004_H)
    extrude(amount=BOX004_DEPTH)


with BuildPart() as fusion010:
    # Box003 → Box003 (new body)
    with BuildSketch(Plane(origin=(10, 10, 0), x_dir=(1, 0, 0), z_dir=(0, 0, 1))):
        with Locations((22.5, 4.5)):
            Rectangle(BOX003_W, BOX003_H)
    extrude(amount=BOX003_DEPTH)

    # Fusion010: union Box004
    add(box004.part)


with BuildPart() as cube001:
    # Box001 → Box001 (new body)
    with BuildSketch(Plane(origin=(0, 19, 0), x_dir=(1, 0, 0), z_dir=(0, 0, 1))):
        with Locations((32.5, 21)):
            Rectangle(BOX001_W, BOX001_H)
    extrude(amount=BOX001_DEPTH)


with BuildPart() as cut009:
    # Box → Box (new body)
    with BuildSketch(Plane.XY):
        with Locations((32.5, 40)):
            Rectangle(BOX_W, BOX_H)
    extrude(amount=BOX_DEPTH)

    # Cut: cut Cube001
    add(cube001.part, mode=Mode.SUBTRACT)

    # Cut006: cut Fusion010
    add(fusion010.part, mode=Mode.SUBTRACT)

    # Cut007: cut Fusion002
    add(fusion002_1.part, mode=Mode.SUBTRACT)

    # Cut008: cut Fusion013
    add(fusion013_1.part, mode=Mode.SUBTRACT)

    # Cut009: cut Fusion014
    add(fusion014_2.part, mode=Mode.SUBTRACT)


with BuildPart() as chamfer_body:
    # Box007 → Box007 (new body)
    with BuildSketch(Plane(origin=(0, -2, 4), x_dir=(1, 0, 0), z_dir=(0, 0, 1))):
        with Locations((5, 5)):
            Rectangle(BOX007_W, BOX007_H)
    extrude(amount=BOX007_DEPTH)

    # Chamfer
    chamfer_edges = [chamfer_body.edges().sort_by_distance(p)[0] for p in [
        (5, -2, 4),
    ]]
    chamfer(chamfer_edges, length=CHAMFER_SIZE)


with BuildPart() as part_mirroring001:
    # Part__Mirroring001: instance of Chamfer body
    add(chamfer_body.part.mirror(Plane(origin=(0, 0, 0), x_dir=(1, 0, 0), z_dir=(0, 1, 0))))


with BuildPart() as part_mirroring001_1:
    # Part__Mirroring001 placement: moved
    add(part_mirroring001.part.moved(Location((0, 80, 0))))


with BuildPart() as gearbox_holder:
    # Box002 → Box002 (new body)
    with BuildSketch(Plane(origin=(0, -2, 4), x_dir=(1, 0, 0), z_dir=(0, 0, 1))):
        with Locations((5, 5)):
            Rectangle(BOX002_W, BOX002_H)
    extrude(amount=BOX002_DEPTH)

    # Chamfer002
    chamfer002_edges = [gearbox_holder.edges().sort_by_distance(p)[0] for p in [
        (5, -2, 4),
    ]]
    chamfer(chamfer002_edges, length=CHAMFER002_SIZE)

    # Fusion015: union Cut009, Part__Mirroring001
    add(cut009.part)
    add(part_mirroring001_1.part)

    # Cut010: cut Fusion018
    add(fusion018.part, mode=Mode.SUBTRACT)

    # Cut011: cut Fusion019
    add(fusion019.part, mode=Mode.SUBTRACT)


solid = gearbox_holder.part
